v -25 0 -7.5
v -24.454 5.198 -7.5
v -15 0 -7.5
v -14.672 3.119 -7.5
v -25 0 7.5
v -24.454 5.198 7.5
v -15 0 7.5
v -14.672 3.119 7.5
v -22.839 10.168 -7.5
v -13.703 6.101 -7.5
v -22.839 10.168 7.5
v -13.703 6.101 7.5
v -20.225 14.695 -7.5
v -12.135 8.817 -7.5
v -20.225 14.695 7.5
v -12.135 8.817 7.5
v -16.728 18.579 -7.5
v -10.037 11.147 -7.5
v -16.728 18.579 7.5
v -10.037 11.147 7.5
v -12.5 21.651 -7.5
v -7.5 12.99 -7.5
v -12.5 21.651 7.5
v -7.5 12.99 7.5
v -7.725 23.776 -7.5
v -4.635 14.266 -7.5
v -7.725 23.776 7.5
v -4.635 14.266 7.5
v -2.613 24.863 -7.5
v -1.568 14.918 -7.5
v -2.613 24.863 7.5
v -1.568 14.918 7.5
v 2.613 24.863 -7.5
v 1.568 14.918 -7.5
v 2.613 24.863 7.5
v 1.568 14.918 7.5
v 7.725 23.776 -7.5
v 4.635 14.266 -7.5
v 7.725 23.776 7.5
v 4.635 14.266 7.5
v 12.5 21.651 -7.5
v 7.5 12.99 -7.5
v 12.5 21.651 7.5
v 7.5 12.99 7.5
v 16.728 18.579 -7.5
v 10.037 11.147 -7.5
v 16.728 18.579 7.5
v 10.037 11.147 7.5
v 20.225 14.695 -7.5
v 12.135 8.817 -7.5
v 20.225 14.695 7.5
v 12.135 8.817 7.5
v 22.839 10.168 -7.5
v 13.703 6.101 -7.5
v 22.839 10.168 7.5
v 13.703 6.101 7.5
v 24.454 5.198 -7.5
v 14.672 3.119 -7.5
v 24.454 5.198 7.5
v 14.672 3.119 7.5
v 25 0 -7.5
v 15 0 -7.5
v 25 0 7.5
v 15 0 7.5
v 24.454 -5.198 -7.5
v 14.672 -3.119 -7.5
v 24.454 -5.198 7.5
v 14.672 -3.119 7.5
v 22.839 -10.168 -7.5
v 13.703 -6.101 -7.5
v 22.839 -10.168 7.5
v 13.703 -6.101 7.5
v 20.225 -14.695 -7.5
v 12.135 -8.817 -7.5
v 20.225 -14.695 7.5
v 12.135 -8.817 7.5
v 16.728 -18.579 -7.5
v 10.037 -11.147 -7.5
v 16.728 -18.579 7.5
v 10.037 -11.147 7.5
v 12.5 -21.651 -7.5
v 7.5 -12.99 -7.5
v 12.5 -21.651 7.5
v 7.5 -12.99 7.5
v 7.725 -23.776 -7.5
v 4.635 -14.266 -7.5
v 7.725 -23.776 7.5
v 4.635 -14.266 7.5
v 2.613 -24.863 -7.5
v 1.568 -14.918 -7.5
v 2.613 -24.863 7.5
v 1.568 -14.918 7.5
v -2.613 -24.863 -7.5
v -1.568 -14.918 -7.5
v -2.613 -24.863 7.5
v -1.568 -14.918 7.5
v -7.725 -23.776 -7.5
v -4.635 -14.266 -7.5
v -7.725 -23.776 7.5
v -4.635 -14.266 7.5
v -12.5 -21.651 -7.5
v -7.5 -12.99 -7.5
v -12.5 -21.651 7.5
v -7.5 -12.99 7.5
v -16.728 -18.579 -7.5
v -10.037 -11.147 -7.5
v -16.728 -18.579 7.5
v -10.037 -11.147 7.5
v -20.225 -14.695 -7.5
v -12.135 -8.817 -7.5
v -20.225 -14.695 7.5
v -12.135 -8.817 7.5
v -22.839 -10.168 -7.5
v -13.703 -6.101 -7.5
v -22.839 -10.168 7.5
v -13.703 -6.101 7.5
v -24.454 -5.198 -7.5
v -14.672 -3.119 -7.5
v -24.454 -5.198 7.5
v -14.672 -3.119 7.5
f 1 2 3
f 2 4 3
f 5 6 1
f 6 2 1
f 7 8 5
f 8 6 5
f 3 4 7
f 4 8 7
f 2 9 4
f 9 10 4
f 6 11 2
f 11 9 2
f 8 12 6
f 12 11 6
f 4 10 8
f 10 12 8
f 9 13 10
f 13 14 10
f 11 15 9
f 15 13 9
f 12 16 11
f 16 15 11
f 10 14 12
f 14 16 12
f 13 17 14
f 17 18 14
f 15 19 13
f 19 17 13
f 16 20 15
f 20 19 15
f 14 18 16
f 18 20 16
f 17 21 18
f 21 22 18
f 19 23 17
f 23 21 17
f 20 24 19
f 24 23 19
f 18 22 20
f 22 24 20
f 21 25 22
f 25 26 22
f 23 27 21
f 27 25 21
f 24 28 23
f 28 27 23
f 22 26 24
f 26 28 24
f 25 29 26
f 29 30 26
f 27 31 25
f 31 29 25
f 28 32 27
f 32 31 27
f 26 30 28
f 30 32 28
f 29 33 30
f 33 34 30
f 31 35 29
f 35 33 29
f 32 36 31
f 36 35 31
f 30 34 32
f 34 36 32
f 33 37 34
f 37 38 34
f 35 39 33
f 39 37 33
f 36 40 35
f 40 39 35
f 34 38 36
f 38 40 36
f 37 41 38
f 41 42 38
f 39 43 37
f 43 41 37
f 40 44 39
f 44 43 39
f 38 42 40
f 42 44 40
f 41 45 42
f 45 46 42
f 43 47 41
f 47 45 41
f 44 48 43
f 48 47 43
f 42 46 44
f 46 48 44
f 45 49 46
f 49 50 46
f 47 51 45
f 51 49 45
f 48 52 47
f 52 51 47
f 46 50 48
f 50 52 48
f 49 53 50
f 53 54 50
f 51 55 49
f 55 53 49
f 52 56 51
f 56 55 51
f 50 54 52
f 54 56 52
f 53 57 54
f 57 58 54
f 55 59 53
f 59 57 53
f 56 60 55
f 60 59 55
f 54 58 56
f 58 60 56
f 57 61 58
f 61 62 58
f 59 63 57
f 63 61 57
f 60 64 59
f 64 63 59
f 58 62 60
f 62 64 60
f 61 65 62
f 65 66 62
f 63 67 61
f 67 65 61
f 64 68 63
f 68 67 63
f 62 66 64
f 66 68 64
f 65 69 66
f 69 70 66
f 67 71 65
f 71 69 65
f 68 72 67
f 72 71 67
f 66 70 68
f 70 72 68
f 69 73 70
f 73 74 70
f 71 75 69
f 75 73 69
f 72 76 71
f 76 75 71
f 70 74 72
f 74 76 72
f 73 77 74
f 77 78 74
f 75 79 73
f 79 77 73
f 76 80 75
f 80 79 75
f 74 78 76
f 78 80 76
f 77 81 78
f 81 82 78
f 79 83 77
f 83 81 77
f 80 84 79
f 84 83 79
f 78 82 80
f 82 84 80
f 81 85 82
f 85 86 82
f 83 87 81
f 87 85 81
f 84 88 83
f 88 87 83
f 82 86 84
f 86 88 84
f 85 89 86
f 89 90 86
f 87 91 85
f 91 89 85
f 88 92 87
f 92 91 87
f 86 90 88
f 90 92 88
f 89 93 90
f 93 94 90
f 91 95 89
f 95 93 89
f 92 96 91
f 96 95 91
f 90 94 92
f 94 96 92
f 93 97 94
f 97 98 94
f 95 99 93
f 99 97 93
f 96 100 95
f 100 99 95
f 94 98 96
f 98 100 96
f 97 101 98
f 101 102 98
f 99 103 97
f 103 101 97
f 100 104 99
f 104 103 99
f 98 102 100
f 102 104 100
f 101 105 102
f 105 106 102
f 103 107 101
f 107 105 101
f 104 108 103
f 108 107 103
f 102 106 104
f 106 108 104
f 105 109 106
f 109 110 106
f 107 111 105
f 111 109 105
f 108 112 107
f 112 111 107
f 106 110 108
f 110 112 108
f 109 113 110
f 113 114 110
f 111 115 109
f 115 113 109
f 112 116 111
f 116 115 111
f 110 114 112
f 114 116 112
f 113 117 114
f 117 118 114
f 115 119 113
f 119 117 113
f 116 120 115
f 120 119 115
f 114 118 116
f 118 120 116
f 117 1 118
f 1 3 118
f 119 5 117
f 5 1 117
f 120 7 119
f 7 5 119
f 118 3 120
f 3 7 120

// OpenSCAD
// See http://reprapide.fr/tutoriel-openscad-formes-2d

rotate_extrude() translate([20, 0, 0]) square([10,15], center=true);
